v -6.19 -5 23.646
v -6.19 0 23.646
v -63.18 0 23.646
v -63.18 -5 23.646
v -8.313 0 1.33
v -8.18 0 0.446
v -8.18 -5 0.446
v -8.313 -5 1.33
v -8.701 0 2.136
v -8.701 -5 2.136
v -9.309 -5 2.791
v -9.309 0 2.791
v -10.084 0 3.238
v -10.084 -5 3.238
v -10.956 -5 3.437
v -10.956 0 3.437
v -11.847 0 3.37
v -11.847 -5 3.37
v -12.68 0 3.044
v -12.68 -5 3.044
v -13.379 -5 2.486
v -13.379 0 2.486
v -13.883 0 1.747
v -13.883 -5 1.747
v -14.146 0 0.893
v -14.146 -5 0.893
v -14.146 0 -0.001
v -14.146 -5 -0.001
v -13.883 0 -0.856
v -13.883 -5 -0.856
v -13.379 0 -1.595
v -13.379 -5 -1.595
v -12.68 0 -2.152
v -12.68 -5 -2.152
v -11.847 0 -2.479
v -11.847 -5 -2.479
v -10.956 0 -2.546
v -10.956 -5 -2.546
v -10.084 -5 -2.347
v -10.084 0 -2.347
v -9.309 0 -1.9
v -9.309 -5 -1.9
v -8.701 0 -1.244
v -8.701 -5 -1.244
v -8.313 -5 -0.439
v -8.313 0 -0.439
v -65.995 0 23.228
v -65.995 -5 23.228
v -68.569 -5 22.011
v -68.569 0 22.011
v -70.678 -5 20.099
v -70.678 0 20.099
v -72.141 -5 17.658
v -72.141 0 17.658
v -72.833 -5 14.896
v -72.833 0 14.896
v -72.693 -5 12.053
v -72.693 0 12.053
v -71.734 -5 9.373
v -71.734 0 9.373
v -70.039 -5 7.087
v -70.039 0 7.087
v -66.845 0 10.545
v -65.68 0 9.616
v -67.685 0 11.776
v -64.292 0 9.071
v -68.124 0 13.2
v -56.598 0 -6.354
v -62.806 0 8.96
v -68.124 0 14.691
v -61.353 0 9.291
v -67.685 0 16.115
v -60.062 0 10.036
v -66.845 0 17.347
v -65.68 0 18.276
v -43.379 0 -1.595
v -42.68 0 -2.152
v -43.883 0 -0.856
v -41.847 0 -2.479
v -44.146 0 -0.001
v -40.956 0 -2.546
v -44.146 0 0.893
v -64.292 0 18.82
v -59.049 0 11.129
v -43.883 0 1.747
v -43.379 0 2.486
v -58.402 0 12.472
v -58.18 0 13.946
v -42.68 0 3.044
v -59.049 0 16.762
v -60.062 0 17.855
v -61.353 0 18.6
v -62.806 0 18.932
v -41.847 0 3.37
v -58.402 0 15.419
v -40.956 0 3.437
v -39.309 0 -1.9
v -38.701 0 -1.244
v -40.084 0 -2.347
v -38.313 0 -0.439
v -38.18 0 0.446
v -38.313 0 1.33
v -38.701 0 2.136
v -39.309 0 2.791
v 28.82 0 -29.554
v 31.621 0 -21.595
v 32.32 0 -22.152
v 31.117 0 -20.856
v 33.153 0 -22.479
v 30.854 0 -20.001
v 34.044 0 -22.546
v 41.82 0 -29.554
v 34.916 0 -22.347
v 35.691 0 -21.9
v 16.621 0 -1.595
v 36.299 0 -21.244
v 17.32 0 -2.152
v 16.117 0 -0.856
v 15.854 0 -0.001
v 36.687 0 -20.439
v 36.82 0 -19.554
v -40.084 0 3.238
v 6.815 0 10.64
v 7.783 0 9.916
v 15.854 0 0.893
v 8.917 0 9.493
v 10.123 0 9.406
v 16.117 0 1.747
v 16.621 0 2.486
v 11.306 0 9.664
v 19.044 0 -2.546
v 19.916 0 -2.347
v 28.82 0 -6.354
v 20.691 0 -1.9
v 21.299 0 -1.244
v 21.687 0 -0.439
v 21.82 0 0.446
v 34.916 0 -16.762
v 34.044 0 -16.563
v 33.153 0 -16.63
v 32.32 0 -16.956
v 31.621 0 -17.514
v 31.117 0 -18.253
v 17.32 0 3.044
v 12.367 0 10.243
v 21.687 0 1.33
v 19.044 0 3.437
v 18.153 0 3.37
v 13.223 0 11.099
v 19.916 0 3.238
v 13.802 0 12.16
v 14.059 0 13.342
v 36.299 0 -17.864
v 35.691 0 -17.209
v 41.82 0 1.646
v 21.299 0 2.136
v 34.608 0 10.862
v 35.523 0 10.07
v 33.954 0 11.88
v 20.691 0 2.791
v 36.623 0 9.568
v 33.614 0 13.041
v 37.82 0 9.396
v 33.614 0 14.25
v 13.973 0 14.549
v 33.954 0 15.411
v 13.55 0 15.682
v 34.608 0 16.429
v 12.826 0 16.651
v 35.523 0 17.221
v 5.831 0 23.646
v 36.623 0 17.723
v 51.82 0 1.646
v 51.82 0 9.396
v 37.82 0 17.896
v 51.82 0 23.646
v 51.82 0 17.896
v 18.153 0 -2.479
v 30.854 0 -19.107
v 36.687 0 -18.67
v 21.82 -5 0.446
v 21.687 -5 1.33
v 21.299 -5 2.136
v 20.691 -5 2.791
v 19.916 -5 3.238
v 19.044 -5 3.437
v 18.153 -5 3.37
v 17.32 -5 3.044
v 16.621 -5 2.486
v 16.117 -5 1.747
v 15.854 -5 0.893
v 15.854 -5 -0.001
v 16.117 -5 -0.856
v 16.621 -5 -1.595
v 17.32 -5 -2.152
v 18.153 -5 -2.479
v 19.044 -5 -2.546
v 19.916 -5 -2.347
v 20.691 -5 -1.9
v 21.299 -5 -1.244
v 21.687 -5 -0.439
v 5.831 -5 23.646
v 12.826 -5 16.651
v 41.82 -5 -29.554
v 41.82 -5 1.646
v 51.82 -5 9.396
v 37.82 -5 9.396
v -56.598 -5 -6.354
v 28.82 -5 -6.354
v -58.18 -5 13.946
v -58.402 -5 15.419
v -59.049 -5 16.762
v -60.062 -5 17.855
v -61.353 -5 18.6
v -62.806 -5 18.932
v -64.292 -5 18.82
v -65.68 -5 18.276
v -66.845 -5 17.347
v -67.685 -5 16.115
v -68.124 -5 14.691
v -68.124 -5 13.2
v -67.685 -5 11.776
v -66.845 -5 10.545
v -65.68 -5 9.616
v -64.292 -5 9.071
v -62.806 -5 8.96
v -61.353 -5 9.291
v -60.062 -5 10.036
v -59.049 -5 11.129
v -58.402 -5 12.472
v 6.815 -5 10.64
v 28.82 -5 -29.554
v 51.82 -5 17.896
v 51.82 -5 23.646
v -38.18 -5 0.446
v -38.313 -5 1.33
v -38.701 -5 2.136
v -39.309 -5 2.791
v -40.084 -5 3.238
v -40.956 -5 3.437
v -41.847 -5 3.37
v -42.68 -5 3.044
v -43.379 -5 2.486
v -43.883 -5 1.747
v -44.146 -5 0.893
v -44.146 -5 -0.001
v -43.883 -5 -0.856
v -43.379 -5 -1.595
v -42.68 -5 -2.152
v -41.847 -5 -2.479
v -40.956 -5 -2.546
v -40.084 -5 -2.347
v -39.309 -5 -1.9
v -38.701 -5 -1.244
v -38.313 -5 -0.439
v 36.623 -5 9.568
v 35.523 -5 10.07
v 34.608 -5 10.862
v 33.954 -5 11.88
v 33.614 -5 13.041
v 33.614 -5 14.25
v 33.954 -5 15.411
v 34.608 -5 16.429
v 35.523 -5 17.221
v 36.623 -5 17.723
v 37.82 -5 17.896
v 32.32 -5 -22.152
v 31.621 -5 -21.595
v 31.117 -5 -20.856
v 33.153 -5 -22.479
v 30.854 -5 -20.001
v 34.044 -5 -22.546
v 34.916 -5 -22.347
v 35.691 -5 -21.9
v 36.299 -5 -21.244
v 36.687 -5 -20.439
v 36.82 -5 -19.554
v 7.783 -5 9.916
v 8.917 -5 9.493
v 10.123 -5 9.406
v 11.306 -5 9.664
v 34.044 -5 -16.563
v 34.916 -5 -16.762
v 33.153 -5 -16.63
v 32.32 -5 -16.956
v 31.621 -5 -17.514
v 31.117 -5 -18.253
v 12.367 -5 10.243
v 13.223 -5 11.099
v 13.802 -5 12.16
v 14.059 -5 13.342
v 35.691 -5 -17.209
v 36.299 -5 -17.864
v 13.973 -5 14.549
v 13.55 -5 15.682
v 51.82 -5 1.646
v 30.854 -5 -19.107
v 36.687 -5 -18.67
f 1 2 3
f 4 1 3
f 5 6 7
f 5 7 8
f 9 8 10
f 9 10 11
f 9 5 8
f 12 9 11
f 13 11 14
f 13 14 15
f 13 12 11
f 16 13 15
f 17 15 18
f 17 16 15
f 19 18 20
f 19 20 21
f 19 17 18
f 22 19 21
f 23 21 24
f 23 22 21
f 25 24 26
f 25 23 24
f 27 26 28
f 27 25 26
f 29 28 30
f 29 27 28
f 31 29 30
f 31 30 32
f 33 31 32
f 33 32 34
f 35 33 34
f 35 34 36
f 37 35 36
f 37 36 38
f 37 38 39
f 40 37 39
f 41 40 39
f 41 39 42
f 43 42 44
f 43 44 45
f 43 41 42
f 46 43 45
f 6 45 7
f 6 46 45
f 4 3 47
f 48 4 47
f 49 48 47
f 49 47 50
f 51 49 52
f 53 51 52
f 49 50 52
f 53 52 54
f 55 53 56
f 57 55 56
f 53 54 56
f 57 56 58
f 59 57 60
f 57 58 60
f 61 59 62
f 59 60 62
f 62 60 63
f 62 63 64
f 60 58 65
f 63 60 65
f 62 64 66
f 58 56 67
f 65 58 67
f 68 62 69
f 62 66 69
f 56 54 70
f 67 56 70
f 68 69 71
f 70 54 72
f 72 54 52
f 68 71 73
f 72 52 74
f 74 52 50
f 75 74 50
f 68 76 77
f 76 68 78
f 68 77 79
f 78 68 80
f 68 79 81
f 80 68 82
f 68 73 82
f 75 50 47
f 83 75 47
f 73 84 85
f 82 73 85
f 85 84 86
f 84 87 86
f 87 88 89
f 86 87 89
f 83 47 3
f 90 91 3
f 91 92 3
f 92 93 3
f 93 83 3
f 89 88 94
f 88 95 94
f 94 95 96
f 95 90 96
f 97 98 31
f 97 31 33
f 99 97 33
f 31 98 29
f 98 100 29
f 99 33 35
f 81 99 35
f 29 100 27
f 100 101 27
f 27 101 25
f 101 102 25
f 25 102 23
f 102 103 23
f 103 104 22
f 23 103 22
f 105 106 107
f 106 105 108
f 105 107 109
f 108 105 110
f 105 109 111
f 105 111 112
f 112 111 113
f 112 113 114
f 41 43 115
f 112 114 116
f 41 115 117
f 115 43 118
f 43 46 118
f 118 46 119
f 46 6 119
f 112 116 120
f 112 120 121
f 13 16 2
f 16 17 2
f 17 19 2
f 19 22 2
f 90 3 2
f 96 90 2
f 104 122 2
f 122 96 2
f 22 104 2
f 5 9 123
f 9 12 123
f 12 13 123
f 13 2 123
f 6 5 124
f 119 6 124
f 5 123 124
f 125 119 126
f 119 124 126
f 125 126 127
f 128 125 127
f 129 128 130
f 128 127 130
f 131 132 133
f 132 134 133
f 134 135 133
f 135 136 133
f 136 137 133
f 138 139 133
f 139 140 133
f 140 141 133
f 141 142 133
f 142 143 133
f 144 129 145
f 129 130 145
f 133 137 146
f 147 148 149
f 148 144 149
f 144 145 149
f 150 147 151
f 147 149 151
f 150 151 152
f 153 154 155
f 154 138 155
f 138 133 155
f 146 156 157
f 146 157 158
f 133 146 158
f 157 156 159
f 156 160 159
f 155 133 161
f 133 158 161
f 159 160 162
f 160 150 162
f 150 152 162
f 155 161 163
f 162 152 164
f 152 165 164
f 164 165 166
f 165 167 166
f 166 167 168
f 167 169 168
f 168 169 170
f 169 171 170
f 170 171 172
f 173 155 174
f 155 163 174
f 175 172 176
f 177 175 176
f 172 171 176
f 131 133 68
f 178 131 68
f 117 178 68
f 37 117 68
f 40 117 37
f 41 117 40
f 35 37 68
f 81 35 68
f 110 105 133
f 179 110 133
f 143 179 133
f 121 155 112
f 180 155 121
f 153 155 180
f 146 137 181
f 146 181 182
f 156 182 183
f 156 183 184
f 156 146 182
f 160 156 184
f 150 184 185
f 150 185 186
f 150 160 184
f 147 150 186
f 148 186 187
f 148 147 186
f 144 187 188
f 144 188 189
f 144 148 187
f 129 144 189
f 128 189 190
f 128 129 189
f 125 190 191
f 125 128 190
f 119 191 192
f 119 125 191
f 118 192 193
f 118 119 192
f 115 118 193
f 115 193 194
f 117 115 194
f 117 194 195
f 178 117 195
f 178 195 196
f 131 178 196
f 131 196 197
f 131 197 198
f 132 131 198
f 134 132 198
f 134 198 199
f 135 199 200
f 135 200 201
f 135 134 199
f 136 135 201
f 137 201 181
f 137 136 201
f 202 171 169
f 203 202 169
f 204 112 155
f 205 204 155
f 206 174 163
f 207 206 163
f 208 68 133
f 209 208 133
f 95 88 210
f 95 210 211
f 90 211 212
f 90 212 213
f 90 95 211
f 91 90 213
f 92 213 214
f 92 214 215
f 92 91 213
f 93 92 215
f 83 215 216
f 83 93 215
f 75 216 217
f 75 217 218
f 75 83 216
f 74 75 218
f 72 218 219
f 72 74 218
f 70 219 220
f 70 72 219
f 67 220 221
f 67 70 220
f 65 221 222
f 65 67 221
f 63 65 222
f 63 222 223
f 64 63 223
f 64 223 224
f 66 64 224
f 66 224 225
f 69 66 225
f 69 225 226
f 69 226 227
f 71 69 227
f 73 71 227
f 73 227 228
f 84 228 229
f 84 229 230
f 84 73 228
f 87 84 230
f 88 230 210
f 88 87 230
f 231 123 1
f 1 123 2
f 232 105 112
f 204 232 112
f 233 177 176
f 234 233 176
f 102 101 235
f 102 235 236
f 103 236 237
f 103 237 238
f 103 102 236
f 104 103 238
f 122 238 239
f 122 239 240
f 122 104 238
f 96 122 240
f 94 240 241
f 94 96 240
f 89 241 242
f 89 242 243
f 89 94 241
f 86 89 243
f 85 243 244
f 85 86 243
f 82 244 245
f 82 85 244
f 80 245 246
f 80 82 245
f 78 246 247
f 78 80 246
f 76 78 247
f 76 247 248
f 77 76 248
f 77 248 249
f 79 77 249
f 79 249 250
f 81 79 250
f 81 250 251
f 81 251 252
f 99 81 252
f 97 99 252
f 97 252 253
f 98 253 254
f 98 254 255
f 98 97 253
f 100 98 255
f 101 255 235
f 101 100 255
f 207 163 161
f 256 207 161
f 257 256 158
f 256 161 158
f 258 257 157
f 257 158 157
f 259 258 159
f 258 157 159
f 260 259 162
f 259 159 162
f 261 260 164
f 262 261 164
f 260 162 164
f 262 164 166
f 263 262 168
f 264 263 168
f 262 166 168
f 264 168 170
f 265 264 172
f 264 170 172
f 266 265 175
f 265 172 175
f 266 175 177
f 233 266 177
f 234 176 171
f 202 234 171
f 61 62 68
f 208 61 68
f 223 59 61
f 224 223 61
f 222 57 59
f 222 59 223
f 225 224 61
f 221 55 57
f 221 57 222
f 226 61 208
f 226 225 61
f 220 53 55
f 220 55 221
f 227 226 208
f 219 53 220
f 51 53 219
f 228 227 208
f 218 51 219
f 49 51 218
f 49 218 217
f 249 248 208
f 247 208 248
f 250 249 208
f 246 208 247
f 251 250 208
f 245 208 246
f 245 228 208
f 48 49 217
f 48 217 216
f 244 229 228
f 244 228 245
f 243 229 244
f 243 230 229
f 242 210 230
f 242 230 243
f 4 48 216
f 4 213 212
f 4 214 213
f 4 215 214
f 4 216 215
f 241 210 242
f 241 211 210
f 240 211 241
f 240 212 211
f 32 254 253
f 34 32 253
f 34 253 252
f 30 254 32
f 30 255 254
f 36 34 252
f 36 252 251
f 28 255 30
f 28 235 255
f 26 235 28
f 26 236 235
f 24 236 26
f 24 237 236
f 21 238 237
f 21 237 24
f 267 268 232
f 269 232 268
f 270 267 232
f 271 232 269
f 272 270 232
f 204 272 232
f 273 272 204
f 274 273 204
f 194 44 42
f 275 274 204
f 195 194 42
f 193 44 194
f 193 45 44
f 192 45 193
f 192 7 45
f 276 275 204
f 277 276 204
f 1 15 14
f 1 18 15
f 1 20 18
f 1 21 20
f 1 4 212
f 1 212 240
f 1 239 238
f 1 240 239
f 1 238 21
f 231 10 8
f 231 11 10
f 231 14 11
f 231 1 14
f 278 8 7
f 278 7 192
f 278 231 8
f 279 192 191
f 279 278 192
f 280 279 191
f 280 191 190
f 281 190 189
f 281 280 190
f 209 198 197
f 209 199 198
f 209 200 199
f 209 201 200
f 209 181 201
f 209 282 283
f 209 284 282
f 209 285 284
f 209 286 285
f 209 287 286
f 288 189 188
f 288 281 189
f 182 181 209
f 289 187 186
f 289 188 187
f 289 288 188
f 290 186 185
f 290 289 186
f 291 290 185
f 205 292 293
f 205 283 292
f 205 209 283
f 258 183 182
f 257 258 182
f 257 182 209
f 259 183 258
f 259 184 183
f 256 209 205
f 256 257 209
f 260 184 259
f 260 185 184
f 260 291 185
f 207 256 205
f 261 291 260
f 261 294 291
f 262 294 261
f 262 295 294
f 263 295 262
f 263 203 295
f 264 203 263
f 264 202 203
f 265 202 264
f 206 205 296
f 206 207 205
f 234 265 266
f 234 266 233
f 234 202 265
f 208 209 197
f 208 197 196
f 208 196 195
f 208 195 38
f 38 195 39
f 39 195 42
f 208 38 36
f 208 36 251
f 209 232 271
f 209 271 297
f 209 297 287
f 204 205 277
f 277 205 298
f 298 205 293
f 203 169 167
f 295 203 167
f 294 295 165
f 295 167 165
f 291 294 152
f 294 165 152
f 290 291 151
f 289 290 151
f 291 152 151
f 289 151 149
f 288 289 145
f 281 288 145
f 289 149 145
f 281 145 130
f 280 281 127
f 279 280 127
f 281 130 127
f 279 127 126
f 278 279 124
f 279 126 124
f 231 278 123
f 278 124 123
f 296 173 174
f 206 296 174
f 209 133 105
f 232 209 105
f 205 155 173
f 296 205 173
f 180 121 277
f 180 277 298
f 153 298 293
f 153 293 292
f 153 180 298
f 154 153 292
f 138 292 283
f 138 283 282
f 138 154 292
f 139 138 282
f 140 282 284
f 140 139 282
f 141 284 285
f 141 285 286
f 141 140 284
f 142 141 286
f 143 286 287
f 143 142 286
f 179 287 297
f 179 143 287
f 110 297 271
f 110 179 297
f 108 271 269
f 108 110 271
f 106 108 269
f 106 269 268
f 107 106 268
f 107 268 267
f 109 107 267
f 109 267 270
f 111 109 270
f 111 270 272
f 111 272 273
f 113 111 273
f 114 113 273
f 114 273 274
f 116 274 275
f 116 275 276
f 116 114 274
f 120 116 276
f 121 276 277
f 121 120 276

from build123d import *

# Parameters (mm, degrees)
F0_R     = 3
F0_R_2   = 5
F1_DEPTH = 5


with BuildPart() as f1:
    # F0 (on Front) → F1 (new body)
    with BuildSketch(Plane.XZ):
        with BuildLine():
            Line((-6.190103, 23.645651), (-63.179695, 23.645651))
            ThreePointArc((-63.179695, 23.645651), (-72.141327, 17.657681), (-70.038631, 7.086716))
            Line((-70.038631, 7.086716), (-56.597567, -6.354349))
            Line((-56.597567, -6.354349), (28.820305, -6.354349))
            Line((28.820305, -6.354349), (28.820305, -29.554349))
            Line((28.820305, -29.554349), (41.820305, -29.554349))
            Line((41.820305, -29.554349), (41.820305, 1.645651))
            Line((41.820305, 1.645651), (51.820305, 1.645651))
            Line((51.820305, 1.645651), (51.820305, 9.395651))
            Line((51.820305, 9.395651), (37.820305, 9.395651))
            ThreePointArc((37.820305, 9.395651), (33.570305, 13.645651), (37.820305, 17.895651))
            Line((37.820305, 17.895651), (51.820305, 17.895651))
            Line((51.820305, 17.895651), (51.820305, 23.645651))
            Line((51.820305, 23.645651), (16.653307, 23.645651))
            Line((16.653307, 23.645651), (16.080297, 23.645651))
            Line((16.080297, 23.645651), (5.830712, 23.645651))
            Line((5.830712, 23.645651), (12.825509, 16.650855))
            ThreePointArc((12.825509, 16.650855), (12.825509, 10.640448), (6.815101, 10.640448))
            Line((6.815101, 10.640448), (-6.190103, 23.645651))
        make_face()
        with Locations((33.820305, -19.554349)):
            Circle(F0_R, mode=Mode.SUBTRACT)
        with Locations((-41.179695, 0.445651)):
            Circle(F0_R, mode=Mode.SUBTRACT)
        with Locations((-11.179695, 0.445651)):
            Circle(F0_R, mode=Mode.SUBTRACT)
        with Locations((-63.179695, 13.945651)):
            Circle(F0_R_2, mode=Mode.SUBTRACT)
        with Locations((18.820305, 0.445651)):
            Circle(F0_R, mode=Mode.SUBTRACT)
    extrude(amount=F1_DEPTH)


solid = f1.part
